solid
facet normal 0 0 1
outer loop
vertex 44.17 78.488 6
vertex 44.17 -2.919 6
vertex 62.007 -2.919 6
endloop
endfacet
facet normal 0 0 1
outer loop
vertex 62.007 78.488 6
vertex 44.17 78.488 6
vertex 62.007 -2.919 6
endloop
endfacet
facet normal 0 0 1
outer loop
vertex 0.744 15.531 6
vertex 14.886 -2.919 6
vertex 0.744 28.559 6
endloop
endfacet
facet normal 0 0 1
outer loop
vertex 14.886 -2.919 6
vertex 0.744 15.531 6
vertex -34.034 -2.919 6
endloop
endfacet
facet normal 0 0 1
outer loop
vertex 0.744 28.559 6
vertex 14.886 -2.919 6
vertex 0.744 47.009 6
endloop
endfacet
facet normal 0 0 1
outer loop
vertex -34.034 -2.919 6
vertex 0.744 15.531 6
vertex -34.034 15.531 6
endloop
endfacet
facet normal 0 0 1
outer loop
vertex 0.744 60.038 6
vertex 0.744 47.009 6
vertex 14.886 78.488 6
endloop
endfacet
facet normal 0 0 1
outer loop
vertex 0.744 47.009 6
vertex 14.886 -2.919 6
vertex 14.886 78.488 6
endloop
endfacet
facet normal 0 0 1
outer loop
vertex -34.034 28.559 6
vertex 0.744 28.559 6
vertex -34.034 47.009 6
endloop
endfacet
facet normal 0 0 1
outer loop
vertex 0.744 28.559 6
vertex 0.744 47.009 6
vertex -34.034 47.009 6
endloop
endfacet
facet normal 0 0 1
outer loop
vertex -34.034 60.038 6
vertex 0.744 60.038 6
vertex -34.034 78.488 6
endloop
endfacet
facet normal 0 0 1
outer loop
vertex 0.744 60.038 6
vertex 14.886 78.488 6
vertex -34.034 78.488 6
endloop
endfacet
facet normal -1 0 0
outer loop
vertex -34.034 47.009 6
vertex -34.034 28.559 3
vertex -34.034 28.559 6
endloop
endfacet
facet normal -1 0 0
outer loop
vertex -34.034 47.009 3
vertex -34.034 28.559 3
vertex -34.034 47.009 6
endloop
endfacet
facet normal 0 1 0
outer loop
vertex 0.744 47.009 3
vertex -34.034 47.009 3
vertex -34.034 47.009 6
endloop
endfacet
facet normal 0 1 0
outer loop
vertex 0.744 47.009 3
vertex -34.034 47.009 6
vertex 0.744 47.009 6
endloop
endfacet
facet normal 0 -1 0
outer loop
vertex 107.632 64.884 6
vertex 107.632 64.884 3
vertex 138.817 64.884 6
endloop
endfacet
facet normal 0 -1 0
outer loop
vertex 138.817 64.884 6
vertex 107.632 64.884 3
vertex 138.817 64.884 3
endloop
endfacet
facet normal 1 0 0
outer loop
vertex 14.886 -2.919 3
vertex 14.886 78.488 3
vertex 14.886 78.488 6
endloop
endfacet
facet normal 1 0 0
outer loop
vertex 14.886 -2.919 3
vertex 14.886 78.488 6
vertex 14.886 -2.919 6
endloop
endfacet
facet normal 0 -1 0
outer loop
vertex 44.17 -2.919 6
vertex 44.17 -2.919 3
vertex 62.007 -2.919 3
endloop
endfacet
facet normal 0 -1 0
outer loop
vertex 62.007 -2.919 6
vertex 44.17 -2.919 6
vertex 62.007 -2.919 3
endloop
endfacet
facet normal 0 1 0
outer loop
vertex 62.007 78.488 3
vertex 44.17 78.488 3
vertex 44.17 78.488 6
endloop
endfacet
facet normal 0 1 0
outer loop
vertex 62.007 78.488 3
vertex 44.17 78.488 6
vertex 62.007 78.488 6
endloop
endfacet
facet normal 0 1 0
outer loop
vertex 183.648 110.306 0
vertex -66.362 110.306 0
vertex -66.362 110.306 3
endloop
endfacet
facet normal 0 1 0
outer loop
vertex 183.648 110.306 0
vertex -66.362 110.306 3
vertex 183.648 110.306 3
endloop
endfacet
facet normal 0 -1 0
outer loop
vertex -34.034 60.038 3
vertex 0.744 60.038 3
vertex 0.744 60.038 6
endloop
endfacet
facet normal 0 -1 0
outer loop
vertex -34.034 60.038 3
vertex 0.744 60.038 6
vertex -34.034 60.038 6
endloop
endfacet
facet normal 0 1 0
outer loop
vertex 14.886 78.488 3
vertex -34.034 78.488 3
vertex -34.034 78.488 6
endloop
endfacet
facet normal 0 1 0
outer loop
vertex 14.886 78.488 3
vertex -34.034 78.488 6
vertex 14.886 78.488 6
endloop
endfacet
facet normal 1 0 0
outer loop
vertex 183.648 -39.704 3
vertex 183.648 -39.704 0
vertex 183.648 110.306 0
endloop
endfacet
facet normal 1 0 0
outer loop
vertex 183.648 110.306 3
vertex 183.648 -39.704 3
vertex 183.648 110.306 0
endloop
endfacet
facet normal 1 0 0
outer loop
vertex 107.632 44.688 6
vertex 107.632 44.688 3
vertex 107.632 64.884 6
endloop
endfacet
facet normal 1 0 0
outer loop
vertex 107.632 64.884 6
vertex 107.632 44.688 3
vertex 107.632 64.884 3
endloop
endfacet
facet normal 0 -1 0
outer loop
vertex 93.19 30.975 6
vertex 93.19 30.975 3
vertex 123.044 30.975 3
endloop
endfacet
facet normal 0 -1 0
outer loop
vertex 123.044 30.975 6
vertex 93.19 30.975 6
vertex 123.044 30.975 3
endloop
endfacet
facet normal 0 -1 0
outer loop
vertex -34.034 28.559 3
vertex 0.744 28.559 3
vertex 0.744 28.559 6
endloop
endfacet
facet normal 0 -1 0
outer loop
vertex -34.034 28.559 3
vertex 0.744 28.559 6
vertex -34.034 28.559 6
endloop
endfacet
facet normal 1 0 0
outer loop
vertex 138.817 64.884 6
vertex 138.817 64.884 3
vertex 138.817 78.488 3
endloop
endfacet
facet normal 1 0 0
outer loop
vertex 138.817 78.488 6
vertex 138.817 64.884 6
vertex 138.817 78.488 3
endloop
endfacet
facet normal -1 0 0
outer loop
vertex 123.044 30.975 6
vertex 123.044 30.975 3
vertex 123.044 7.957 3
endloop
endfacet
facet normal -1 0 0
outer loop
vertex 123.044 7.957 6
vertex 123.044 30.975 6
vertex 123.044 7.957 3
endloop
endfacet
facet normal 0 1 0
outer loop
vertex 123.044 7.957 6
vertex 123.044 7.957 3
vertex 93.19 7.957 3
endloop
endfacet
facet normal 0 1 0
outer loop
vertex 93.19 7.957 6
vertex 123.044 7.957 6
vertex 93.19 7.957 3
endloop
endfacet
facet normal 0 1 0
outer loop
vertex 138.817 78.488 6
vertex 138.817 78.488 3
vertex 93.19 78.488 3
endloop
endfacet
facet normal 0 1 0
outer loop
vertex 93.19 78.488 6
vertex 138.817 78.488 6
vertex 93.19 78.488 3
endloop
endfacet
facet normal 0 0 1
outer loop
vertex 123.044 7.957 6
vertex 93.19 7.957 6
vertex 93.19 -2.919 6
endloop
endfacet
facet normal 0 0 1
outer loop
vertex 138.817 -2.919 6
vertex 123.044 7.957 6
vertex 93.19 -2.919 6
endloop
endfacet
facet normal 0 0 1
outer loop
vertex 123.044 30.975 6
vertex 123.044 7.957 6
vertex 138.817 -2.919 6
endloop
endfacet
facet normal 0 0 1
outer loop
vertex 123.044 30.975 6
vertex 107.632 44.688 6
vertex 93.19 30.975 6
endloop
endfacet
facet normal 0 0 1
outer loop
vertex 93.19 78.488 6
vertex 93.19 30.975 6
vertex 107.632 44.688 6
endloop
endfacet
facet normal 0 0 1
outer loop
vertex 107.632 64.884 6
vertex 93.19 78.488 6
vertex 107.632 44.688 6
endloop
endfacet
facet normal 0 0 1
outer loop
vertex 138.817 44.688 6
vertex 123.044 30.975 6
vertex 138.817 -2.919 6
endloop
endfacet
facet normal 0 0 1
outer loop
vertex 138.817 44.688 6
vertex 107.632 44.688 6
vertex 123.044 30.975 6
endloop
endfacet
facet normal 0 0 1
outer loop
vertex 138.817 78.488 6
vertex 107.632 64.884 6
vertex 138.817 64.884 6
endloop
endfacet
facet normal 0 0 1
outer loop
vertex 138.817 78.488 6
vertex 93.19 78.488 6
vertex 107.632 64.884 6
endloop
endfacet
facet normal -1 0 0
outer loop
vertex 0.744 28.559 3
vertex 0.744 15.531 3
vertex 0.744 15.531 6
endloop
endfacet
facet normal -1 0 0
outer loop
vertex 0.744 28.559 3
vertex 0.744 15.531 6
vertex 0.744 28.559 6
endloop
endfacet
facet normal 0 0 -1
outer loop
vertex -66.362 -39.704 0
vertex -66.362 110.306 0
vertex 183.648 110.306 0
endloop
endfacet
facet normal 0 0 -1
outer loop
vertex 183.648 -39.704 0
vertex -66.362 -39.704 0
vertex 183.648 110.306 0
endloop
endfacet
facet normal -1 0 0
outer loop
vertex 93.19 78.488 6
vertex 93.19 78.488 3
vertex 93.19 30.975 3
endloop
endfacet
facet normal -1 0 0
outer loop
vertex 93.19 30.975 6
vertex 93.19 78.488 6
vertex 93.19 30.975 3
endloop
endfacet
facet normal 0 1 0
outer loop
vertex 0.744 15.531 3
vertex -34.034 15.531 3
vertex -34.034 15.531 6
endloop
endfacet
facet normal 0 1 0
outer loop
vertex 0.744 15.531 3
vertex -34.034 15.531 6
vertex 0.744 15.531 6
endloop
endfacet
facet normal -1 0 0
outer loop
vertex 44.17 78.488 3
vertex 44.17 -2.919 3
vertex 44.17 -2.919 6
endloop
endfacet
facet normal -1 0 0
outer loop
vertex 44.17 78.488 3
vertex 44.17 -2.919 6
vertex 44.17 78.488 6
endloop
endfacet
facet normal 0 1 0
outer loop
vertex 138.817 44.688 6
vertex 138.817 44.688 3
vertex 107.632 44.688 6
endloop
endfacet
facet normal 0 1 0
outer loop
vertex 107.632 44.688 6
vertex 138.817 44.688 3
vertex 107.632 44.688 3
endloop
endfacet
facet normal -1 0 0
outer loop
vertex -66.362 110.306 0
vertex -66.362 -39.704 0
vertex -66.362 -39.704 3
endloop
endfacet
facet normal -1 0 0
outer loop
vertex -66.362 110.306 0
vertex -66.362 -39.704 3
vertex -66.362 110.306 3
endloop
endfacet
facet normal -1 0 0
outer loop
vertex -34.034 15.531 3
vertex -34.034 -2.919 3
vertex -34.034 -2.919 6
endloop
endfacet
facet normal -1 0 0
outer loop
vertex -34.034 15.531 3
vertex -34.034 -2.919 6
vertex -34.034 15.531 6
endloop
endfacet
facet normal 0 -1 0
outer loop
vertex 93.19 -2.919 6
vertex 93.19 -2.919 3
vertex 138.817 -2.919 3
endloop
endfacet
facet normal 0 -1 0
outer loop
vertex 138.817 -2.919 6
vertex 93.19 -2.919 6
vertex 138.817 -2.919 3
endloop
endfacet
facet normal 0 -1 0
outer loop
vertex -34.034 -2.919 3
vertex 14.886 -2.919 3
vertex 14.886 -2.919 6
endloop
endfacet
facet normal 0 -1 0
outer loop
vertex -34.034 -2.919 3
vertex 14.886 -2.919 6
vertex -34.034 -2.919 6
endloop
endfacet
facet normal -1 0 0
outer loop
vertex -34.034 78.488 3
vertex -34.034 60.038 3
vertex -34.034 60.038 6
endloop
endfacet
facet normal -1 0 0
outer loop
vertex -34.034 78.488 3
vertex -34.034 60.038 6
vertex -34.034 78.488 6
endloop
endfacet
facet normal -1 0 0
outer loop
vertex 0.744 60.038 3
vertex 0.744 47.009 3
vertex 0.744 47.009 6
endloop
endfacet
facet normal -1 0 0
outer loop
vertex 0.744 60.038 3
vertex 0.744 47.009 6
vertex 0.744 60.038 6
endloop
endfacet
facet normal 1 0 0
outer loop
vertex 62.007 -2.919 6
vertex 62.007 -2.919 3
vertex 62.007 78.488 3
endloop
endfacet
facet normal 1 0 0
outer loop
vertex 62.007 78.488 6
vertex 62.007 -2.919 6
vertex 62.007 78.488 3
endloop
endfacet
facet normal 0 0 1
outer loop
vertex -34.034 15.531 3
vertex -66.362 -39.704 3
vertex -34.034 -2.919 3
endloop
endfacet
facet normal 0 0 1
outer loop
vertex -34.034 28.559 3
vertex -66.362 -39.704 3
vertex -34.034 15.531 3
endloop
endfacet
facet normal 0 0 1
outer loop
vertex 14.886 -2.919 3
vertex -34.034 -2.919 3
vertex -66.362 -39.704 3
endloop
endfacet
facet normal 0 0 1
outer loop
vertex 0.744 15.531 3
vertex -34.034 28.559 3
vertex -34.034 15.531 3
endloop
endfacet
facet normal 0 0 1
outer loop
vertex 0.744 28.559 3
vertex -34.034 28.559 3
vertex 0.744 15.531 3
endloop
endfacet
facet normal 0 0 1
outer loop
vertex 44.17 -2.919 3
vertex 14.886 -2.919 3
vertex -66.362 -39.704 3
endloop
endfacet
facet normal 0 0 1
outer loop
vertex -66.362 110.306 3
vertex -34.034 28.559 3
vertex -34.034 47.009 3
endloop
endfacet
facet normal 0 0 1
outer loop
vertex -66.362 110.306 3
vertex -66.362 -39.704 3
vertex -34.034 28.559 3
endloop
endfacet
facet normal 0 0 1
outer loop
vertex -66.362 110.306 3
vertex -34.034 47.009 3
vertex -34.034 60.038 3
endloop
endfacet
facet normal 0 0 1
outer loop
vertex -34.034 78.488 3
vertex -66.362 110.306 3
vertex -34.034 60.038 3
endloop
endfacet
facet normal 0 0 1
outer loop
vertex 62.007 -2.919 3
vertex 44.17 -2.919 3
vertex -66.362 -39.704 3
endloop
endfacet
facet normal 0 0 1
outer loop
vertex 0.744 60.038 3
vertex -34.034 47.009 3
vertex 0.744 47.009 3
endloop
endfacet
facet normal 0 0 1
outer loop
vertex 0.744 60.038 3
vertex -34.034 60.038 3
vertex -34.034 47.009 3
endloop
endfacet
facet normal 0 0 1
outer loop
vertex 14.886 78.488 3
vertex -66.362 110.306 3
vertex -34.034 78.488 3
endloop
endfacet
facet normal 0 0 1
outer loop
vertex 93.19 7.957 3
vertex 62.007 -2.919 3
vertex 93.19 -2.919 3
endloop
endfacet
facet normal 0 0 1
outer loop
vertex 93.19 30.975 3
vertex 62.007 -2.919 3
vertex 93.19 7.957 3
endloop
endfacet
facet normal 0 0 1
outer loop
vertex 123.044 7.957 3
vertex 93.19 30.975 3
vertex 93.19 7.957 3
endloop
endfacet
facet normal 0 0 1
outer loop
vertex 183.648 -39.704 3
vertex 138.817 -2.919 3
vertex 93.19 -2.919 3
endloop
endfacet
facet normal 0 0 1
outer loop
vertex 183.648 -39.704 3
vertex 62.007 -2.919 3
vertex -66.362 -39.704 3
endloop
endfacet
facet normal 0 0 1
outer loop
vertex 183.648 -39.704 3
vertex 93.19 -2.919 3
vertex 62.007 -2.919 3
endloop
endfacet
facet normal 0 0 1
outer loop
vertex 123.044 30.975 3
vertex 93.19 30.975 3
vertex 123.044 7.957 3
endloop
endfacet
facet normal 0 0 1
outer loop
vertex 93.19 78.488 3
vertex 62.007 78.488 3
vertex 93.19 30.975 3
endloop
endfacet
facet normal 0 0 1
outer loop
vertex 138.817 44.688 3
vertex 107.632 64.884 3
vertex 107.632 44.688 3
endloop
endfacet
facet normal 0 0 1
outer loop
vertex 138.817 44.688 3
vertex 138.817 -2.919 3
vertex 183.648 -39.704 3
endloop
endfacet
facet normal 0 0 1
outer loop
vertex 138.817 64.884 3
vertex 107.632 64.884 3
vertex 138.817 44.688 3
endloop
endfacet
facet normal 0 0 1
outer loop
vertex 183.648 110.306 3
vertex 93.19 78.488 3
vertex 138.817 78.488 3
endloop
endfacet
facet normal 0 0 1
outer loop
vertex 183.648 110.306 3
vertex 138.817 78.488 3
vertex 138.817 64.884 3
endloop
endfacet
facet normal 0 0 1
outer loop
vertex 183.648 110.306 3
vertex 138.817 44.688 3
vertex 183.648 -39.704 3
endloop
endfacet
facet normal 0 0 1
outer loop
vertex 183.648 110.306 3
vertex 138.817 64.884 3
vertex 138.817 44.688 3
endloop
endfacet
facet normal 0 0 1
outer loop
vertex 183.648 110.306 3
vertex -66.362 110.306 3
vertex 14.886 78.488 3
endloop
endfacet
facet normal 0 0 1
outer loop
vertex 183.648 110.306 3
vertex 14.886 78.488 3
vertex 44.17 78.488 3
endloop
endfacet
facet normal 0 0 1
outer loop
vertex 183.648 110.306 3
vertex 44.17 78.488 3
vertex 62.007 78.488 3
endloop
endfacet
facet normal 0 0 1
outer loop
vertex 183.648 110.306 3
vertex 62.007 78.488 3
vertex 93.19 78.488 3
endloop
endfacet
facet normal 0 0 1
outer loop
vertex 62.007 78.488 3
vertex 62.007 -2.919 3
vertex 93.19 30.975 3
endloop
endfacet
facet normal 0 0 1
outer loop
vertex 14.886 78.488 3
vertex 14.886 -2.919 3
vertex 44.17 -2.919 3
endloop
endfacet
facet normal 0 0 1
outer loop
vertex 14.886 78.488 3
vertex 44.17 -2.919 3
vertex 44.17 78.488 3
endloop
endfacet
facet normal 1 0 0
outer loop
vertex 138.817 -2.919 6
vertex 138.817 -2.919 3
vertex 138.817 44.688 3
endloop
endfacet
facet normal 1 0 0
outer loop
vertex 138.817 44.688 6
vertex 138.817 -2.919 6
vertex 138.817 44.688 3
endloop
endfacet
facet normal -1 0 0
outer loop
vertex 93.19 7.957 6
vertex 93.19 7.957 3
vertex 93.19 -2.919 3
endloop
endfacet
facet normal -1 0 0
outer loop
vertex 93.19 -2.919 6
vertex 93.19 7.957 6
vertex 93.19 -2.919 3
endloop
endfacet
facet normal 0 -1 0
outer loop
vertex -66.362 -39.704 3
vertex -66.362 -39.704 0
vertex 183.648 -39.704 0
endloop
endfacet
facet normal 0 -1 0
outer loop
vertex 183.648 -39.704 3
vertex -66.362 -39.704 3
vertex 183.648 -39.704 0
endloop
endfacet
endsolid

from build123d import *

# Parameters (mm, degrees)
SKETCH_1_W      = 115.514915432
SKETCH_1_H      = 71.054725524
EXTRUDE_1_DEPTH = 3
SKETCH_2_W      = 8.241625139
SKETCH_2_H      = 38.559694421
EXTRUDE_2_DEPTH = 3
SCALE_1_SCALE_X = 2.164314778
SCALE_1_SCALE_Y = 2.111189303
SCALE_1_SCALE_Z = 1


with BuildPart() as part:
    # 草图1 → 凸台-拉伸1 (new body)
    with BuildSketch(Plane.XY):
        with Locations((57.757457716, 35.527362762)):
            Rectangle(SKETCH_1_W, SKETCH_1_H)
    extrude(amount=EXTRUDE_1_DEPTH)

    # 草图2 → 凸台-拉伸2 (add)
    with BuildSketch(Plane.XY.offset(3)):
        Polygon((14.936991477, 55.983341955), (37.539998531, 55.983341955), (37.539998531, 17.423647534), (14.936991477, 17.423647534), (14.936991477, 26.16273518), (31.006011192, 26.16273518), (31.006011192, 32.333950921), (14.936991477, 32.333950921), (14.936991477, 41.073038567), (31.006011192, 41.073038567), (31.006011192, 47.244254309), (14.936991477, 47.244254309), align=None)
        Polygon((73.719694368, 17.423647534), (94.800903935, 17.423647534), (94.800903935, 39.973675083), (80.392398912, 39.973675083), (80.392398912, 49.539853279), (94.800903935, 49.539853279), (94.800903935, 55.983341955), (73.719694368, 55.983341955), (73.719694368, 33.478121987), (87.513572233, 33.478121987), (87.513572233, 22.575407484), (73.719694368, 22.575407484), align=None)
        with Locations((55.191084261, 36.703494744)):
            Rectangle(SKETCH_2_W, SKETCH_2_H)
    extrude(amount=EXTRUDE_2_DEPTH)


with BuildPart() as part_1:
    # 缩放比例1: scaled about (56.997017768, 35.730737943, 1.967633453)
    add(part.part.scale((SCALE_1_SCALE_X, SCALE_1_SCALE_Y, SCALE_1_SCALE_Z), about=(56.997017768, 35.730737943, 1.967633453)))


solid = part_1.part
